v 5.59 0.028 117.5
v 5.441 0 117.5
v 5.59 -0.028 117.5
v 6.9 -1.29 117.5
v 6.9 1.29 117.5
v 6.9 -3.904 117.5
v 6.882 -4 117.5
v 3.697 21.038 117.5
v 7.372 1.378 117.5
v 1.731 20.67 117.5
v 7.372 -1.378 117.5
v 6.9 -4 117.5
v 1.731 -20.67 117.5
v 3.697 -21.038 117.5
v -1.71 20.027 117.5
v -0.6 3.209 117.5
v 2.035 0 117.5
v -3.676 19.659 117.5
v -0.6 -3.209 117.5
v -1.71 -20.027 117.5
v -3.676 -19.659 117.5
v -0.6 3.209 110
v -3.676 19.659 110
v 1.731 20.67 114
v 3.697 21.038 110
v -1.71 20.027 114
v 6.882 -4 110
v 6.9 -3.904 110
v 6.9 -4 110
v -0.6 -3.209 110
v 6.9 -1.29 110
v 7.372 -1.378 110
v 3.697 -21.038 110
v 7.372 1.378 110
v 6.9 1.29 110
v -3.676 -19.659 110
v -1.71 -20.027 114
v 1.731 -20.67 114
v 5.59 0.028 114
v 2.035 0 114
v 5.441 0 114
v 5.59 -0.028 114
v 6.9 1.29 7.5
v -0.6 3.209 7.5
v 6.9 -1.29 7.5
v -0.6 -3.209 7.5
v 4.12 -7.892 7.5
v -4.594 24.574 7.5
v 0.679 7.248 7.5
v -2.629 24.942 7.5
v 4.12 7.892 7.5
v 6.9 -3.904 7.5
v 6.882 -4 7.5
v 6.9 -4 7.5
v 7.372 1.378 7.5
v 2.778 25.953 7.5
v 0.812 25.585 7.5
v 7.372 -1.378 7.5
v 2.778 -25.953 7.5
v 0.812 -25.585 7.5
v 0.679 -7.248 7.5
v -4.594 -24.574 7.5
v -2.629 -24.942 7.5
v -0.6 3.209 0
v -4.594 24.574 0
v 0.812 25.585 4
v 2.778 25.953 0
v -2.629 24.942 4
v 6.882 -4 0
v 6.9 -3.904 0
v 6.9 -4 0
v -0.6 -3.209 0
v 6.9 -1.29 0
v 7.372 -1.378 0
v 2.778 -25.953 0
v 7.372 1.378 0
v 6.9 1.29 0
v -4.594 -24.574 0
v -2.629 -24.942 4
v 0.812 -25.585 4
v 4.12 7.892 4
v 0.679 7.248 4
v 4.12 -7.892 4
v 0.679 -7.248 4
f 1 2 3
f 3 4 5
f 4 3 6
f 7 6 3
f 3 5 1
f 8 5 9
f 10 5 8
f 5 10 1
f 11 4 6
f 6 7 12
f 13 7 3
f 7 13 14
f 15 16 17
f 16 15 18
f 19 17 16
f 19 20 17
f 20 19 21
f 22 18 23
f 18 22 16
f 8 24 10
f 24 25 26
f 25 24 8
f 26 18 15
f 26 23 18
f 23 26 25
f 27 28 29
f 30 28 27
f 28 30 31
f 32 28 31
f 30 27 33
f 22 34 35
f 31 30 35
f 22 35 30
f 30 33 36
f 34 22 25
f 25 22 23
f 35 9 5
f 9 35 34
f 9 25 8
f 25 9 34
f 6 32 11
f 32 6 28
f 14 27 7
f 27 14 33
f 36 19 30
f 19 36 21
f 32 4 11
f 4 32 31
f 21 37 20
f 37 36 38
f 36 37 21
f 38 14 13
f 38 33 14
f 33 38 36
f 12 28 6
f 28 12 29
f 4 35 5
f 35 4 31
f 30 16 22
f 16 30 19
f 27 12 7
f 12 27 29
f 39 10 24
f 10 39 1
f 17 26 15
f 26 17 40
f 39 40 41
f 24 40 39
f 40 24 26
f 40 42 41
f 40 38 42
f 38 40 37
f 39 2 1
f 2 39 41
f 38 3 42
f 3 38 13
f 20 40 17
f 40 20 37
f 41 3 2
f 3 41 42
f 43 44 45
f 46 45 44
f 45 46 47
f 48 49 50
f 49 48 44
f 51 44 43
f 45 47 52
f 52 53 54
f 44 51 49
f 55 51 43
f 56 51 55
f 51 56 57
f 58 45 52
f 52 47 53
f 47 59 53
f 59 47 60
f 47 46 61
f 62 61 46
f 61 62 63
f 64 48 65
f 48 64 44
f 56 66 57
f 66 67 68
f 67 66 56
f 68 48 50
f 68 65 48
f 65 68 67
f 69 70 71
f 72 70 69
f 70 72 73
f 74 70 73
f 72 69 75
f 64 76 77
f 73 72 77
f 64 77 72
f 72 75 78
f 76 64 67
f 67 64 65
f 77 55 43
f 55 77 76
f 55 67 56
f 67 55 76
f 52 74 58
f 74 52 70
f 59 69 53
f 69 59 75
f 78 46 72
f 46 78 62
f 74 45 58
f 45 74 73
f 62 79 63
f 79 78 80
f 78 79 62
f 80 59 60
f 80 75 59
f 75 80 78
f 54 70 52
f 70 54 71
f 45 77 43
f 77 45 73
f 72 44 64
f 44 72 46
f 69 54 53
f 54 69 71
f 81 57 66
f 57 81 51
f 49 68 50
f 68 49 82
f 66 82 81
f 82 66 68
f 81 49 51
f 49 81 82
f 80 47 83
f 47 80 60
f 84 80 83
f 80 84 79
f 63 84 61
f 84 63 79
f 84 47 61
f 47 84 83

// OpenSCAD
tilt=59.2;
cellHeight=110;
cellWidth=55;
cellThick=3.5;
bracketWidth=8;
triangleFCbase=160.838;
triangleFCleft=103.160;
trangleFCright=123.396;
bottomBracketWidth=25;
topBracketWidth=20;
cornerAngle=21.18/2;

/* 
Triangle
	a: Length of side a
	b: Length of side b
	angle: angle at point angleAB
*/
module Triangle(
			a, b, angle, height=1, heights=undef,
			center=undef, centerXYZ=[false,false,false])
{
	// Calculate Heights at each point
	heightAB = ((heights==undef) ? height : heights[0])/2;
	heightBC = ((heights==undef) ? height : heights[1])/2;
	heightCA = ((heights==undef) ? height : heights[2])/2;
	centerZ = (center || (center==undef && centerXYZ[2]))?0:max(heightAB,heightBC,heightCA);

	// Calculate Offsets for centering
	offsetX = (center || (center==undef && centerXYZ[0]))?((cos(angle)*a)+b)/3:0;
	offsetY = (center || (center==undef && centerXYZ[1]))?(sin(angle)*a)/3:0;
	
	pointAB1 = [-offsetX,-offsetY, centerZ-heightAB];
	pointAB2 = [-offsetX,-offsetY, centerZ+heightAB];
	pointBC1 = [b-offsetX,-offsetY, centerZ-heightBC];
	pointBC2 = [b-offsetX,-offsetY, centerZ+heightBC];
	pointCA1 = [(cos(angle)*a)-offsetX,(sin(angle)*a)-offsetY, centerZ-heightCA];
	pointCA2 = [(cos(angle)*a)-offsetX,(sin(angle)*a)-offsetY, centerZ+heightCA];

	polyhedron(
		points=[	pointAB1, pointBC1, pointCA1,
					pointAB2, pointBC2, pointCA2 ],
		triangles=[	
			[0, 1, 2],
			[3, 5, 4],
			[0, 3, 1],
			[1, 3, 4],
			[1, 4, 2],
			[2, 4, 5],
			[2, 5, 0],
			[0, 5, 3] ] );
}

module triangleFromCentre() {
//    Triangle(triangleFCleft, triangleFCbase, 50.104);
    Triangle(120, 160.838, 39.896);
}

//triangleFromCentre();

module topBracket(x,y,z) {
thick=cellThick+4;
    difference() {
        union(){
            rotate([0, 0, cornerAngle]) 
                translate([x,y,z]) 
                cube([thick, topBracketWidth, thick]);
            rotate([0, 0, -cornerAngle]) 
                translate([x,y-topBracketWidth,z]) 
                cube([thick, topBracketWidth, thick]);
            rotate([0, 0, 0]) 
                translate([x-0.6,y-4,z]) 
                cube([thick,thick,thick]);
        }
        union(){
            rotate([0, 0, cornerAngle]) 
                translate([x+2,y-1,z+4]) 
                cube([cellThick, topBracketWidth+2, cellThick+1]);
            rotate([0, 0, -cornerAngle])
                translate([x+2,y-topBracketWidth-1,z+4]) 
                cube([cellThick, topBracketWidth+2, 5]);
        }
    }
}

module bottomBracket(x,y,z) {
    thick=cellThick+4;
    difference() {
        union(){
            rotate([0, 0, cornerAngle]) 
                translate([x,y,z]) 
                cube([thick, bottomBracketWidth, thick]);
            rotate([0, 0, -cornerAngle]) 
                translate([x,y-bottomBracketWidth,z]) 
                cube([thick, bottomBracketWidth, thick]);
            rotate([0, 0, 0]) 
                translate([x-0.6,y-4,z]) 
                cube([thick,thick,thick]);
        }
        union(){
            rotate([0, 0, cornerAngle]) 
                translate([x+2,y-1+8,z+4]) 
                cube([cellThick, bottomBracketWidth+2, cellThick+1]);
            rotate([0, 0, -cornerAngle])
                translate([x+2,y-bottomBracketWidth-1,z+4]) 
                cube([cellThick, bottomBracketWidth+2-8, 5]);
        }
    }
}

topBracket(0,0,cellHeight); 
bottomBracket(0,0,0);
